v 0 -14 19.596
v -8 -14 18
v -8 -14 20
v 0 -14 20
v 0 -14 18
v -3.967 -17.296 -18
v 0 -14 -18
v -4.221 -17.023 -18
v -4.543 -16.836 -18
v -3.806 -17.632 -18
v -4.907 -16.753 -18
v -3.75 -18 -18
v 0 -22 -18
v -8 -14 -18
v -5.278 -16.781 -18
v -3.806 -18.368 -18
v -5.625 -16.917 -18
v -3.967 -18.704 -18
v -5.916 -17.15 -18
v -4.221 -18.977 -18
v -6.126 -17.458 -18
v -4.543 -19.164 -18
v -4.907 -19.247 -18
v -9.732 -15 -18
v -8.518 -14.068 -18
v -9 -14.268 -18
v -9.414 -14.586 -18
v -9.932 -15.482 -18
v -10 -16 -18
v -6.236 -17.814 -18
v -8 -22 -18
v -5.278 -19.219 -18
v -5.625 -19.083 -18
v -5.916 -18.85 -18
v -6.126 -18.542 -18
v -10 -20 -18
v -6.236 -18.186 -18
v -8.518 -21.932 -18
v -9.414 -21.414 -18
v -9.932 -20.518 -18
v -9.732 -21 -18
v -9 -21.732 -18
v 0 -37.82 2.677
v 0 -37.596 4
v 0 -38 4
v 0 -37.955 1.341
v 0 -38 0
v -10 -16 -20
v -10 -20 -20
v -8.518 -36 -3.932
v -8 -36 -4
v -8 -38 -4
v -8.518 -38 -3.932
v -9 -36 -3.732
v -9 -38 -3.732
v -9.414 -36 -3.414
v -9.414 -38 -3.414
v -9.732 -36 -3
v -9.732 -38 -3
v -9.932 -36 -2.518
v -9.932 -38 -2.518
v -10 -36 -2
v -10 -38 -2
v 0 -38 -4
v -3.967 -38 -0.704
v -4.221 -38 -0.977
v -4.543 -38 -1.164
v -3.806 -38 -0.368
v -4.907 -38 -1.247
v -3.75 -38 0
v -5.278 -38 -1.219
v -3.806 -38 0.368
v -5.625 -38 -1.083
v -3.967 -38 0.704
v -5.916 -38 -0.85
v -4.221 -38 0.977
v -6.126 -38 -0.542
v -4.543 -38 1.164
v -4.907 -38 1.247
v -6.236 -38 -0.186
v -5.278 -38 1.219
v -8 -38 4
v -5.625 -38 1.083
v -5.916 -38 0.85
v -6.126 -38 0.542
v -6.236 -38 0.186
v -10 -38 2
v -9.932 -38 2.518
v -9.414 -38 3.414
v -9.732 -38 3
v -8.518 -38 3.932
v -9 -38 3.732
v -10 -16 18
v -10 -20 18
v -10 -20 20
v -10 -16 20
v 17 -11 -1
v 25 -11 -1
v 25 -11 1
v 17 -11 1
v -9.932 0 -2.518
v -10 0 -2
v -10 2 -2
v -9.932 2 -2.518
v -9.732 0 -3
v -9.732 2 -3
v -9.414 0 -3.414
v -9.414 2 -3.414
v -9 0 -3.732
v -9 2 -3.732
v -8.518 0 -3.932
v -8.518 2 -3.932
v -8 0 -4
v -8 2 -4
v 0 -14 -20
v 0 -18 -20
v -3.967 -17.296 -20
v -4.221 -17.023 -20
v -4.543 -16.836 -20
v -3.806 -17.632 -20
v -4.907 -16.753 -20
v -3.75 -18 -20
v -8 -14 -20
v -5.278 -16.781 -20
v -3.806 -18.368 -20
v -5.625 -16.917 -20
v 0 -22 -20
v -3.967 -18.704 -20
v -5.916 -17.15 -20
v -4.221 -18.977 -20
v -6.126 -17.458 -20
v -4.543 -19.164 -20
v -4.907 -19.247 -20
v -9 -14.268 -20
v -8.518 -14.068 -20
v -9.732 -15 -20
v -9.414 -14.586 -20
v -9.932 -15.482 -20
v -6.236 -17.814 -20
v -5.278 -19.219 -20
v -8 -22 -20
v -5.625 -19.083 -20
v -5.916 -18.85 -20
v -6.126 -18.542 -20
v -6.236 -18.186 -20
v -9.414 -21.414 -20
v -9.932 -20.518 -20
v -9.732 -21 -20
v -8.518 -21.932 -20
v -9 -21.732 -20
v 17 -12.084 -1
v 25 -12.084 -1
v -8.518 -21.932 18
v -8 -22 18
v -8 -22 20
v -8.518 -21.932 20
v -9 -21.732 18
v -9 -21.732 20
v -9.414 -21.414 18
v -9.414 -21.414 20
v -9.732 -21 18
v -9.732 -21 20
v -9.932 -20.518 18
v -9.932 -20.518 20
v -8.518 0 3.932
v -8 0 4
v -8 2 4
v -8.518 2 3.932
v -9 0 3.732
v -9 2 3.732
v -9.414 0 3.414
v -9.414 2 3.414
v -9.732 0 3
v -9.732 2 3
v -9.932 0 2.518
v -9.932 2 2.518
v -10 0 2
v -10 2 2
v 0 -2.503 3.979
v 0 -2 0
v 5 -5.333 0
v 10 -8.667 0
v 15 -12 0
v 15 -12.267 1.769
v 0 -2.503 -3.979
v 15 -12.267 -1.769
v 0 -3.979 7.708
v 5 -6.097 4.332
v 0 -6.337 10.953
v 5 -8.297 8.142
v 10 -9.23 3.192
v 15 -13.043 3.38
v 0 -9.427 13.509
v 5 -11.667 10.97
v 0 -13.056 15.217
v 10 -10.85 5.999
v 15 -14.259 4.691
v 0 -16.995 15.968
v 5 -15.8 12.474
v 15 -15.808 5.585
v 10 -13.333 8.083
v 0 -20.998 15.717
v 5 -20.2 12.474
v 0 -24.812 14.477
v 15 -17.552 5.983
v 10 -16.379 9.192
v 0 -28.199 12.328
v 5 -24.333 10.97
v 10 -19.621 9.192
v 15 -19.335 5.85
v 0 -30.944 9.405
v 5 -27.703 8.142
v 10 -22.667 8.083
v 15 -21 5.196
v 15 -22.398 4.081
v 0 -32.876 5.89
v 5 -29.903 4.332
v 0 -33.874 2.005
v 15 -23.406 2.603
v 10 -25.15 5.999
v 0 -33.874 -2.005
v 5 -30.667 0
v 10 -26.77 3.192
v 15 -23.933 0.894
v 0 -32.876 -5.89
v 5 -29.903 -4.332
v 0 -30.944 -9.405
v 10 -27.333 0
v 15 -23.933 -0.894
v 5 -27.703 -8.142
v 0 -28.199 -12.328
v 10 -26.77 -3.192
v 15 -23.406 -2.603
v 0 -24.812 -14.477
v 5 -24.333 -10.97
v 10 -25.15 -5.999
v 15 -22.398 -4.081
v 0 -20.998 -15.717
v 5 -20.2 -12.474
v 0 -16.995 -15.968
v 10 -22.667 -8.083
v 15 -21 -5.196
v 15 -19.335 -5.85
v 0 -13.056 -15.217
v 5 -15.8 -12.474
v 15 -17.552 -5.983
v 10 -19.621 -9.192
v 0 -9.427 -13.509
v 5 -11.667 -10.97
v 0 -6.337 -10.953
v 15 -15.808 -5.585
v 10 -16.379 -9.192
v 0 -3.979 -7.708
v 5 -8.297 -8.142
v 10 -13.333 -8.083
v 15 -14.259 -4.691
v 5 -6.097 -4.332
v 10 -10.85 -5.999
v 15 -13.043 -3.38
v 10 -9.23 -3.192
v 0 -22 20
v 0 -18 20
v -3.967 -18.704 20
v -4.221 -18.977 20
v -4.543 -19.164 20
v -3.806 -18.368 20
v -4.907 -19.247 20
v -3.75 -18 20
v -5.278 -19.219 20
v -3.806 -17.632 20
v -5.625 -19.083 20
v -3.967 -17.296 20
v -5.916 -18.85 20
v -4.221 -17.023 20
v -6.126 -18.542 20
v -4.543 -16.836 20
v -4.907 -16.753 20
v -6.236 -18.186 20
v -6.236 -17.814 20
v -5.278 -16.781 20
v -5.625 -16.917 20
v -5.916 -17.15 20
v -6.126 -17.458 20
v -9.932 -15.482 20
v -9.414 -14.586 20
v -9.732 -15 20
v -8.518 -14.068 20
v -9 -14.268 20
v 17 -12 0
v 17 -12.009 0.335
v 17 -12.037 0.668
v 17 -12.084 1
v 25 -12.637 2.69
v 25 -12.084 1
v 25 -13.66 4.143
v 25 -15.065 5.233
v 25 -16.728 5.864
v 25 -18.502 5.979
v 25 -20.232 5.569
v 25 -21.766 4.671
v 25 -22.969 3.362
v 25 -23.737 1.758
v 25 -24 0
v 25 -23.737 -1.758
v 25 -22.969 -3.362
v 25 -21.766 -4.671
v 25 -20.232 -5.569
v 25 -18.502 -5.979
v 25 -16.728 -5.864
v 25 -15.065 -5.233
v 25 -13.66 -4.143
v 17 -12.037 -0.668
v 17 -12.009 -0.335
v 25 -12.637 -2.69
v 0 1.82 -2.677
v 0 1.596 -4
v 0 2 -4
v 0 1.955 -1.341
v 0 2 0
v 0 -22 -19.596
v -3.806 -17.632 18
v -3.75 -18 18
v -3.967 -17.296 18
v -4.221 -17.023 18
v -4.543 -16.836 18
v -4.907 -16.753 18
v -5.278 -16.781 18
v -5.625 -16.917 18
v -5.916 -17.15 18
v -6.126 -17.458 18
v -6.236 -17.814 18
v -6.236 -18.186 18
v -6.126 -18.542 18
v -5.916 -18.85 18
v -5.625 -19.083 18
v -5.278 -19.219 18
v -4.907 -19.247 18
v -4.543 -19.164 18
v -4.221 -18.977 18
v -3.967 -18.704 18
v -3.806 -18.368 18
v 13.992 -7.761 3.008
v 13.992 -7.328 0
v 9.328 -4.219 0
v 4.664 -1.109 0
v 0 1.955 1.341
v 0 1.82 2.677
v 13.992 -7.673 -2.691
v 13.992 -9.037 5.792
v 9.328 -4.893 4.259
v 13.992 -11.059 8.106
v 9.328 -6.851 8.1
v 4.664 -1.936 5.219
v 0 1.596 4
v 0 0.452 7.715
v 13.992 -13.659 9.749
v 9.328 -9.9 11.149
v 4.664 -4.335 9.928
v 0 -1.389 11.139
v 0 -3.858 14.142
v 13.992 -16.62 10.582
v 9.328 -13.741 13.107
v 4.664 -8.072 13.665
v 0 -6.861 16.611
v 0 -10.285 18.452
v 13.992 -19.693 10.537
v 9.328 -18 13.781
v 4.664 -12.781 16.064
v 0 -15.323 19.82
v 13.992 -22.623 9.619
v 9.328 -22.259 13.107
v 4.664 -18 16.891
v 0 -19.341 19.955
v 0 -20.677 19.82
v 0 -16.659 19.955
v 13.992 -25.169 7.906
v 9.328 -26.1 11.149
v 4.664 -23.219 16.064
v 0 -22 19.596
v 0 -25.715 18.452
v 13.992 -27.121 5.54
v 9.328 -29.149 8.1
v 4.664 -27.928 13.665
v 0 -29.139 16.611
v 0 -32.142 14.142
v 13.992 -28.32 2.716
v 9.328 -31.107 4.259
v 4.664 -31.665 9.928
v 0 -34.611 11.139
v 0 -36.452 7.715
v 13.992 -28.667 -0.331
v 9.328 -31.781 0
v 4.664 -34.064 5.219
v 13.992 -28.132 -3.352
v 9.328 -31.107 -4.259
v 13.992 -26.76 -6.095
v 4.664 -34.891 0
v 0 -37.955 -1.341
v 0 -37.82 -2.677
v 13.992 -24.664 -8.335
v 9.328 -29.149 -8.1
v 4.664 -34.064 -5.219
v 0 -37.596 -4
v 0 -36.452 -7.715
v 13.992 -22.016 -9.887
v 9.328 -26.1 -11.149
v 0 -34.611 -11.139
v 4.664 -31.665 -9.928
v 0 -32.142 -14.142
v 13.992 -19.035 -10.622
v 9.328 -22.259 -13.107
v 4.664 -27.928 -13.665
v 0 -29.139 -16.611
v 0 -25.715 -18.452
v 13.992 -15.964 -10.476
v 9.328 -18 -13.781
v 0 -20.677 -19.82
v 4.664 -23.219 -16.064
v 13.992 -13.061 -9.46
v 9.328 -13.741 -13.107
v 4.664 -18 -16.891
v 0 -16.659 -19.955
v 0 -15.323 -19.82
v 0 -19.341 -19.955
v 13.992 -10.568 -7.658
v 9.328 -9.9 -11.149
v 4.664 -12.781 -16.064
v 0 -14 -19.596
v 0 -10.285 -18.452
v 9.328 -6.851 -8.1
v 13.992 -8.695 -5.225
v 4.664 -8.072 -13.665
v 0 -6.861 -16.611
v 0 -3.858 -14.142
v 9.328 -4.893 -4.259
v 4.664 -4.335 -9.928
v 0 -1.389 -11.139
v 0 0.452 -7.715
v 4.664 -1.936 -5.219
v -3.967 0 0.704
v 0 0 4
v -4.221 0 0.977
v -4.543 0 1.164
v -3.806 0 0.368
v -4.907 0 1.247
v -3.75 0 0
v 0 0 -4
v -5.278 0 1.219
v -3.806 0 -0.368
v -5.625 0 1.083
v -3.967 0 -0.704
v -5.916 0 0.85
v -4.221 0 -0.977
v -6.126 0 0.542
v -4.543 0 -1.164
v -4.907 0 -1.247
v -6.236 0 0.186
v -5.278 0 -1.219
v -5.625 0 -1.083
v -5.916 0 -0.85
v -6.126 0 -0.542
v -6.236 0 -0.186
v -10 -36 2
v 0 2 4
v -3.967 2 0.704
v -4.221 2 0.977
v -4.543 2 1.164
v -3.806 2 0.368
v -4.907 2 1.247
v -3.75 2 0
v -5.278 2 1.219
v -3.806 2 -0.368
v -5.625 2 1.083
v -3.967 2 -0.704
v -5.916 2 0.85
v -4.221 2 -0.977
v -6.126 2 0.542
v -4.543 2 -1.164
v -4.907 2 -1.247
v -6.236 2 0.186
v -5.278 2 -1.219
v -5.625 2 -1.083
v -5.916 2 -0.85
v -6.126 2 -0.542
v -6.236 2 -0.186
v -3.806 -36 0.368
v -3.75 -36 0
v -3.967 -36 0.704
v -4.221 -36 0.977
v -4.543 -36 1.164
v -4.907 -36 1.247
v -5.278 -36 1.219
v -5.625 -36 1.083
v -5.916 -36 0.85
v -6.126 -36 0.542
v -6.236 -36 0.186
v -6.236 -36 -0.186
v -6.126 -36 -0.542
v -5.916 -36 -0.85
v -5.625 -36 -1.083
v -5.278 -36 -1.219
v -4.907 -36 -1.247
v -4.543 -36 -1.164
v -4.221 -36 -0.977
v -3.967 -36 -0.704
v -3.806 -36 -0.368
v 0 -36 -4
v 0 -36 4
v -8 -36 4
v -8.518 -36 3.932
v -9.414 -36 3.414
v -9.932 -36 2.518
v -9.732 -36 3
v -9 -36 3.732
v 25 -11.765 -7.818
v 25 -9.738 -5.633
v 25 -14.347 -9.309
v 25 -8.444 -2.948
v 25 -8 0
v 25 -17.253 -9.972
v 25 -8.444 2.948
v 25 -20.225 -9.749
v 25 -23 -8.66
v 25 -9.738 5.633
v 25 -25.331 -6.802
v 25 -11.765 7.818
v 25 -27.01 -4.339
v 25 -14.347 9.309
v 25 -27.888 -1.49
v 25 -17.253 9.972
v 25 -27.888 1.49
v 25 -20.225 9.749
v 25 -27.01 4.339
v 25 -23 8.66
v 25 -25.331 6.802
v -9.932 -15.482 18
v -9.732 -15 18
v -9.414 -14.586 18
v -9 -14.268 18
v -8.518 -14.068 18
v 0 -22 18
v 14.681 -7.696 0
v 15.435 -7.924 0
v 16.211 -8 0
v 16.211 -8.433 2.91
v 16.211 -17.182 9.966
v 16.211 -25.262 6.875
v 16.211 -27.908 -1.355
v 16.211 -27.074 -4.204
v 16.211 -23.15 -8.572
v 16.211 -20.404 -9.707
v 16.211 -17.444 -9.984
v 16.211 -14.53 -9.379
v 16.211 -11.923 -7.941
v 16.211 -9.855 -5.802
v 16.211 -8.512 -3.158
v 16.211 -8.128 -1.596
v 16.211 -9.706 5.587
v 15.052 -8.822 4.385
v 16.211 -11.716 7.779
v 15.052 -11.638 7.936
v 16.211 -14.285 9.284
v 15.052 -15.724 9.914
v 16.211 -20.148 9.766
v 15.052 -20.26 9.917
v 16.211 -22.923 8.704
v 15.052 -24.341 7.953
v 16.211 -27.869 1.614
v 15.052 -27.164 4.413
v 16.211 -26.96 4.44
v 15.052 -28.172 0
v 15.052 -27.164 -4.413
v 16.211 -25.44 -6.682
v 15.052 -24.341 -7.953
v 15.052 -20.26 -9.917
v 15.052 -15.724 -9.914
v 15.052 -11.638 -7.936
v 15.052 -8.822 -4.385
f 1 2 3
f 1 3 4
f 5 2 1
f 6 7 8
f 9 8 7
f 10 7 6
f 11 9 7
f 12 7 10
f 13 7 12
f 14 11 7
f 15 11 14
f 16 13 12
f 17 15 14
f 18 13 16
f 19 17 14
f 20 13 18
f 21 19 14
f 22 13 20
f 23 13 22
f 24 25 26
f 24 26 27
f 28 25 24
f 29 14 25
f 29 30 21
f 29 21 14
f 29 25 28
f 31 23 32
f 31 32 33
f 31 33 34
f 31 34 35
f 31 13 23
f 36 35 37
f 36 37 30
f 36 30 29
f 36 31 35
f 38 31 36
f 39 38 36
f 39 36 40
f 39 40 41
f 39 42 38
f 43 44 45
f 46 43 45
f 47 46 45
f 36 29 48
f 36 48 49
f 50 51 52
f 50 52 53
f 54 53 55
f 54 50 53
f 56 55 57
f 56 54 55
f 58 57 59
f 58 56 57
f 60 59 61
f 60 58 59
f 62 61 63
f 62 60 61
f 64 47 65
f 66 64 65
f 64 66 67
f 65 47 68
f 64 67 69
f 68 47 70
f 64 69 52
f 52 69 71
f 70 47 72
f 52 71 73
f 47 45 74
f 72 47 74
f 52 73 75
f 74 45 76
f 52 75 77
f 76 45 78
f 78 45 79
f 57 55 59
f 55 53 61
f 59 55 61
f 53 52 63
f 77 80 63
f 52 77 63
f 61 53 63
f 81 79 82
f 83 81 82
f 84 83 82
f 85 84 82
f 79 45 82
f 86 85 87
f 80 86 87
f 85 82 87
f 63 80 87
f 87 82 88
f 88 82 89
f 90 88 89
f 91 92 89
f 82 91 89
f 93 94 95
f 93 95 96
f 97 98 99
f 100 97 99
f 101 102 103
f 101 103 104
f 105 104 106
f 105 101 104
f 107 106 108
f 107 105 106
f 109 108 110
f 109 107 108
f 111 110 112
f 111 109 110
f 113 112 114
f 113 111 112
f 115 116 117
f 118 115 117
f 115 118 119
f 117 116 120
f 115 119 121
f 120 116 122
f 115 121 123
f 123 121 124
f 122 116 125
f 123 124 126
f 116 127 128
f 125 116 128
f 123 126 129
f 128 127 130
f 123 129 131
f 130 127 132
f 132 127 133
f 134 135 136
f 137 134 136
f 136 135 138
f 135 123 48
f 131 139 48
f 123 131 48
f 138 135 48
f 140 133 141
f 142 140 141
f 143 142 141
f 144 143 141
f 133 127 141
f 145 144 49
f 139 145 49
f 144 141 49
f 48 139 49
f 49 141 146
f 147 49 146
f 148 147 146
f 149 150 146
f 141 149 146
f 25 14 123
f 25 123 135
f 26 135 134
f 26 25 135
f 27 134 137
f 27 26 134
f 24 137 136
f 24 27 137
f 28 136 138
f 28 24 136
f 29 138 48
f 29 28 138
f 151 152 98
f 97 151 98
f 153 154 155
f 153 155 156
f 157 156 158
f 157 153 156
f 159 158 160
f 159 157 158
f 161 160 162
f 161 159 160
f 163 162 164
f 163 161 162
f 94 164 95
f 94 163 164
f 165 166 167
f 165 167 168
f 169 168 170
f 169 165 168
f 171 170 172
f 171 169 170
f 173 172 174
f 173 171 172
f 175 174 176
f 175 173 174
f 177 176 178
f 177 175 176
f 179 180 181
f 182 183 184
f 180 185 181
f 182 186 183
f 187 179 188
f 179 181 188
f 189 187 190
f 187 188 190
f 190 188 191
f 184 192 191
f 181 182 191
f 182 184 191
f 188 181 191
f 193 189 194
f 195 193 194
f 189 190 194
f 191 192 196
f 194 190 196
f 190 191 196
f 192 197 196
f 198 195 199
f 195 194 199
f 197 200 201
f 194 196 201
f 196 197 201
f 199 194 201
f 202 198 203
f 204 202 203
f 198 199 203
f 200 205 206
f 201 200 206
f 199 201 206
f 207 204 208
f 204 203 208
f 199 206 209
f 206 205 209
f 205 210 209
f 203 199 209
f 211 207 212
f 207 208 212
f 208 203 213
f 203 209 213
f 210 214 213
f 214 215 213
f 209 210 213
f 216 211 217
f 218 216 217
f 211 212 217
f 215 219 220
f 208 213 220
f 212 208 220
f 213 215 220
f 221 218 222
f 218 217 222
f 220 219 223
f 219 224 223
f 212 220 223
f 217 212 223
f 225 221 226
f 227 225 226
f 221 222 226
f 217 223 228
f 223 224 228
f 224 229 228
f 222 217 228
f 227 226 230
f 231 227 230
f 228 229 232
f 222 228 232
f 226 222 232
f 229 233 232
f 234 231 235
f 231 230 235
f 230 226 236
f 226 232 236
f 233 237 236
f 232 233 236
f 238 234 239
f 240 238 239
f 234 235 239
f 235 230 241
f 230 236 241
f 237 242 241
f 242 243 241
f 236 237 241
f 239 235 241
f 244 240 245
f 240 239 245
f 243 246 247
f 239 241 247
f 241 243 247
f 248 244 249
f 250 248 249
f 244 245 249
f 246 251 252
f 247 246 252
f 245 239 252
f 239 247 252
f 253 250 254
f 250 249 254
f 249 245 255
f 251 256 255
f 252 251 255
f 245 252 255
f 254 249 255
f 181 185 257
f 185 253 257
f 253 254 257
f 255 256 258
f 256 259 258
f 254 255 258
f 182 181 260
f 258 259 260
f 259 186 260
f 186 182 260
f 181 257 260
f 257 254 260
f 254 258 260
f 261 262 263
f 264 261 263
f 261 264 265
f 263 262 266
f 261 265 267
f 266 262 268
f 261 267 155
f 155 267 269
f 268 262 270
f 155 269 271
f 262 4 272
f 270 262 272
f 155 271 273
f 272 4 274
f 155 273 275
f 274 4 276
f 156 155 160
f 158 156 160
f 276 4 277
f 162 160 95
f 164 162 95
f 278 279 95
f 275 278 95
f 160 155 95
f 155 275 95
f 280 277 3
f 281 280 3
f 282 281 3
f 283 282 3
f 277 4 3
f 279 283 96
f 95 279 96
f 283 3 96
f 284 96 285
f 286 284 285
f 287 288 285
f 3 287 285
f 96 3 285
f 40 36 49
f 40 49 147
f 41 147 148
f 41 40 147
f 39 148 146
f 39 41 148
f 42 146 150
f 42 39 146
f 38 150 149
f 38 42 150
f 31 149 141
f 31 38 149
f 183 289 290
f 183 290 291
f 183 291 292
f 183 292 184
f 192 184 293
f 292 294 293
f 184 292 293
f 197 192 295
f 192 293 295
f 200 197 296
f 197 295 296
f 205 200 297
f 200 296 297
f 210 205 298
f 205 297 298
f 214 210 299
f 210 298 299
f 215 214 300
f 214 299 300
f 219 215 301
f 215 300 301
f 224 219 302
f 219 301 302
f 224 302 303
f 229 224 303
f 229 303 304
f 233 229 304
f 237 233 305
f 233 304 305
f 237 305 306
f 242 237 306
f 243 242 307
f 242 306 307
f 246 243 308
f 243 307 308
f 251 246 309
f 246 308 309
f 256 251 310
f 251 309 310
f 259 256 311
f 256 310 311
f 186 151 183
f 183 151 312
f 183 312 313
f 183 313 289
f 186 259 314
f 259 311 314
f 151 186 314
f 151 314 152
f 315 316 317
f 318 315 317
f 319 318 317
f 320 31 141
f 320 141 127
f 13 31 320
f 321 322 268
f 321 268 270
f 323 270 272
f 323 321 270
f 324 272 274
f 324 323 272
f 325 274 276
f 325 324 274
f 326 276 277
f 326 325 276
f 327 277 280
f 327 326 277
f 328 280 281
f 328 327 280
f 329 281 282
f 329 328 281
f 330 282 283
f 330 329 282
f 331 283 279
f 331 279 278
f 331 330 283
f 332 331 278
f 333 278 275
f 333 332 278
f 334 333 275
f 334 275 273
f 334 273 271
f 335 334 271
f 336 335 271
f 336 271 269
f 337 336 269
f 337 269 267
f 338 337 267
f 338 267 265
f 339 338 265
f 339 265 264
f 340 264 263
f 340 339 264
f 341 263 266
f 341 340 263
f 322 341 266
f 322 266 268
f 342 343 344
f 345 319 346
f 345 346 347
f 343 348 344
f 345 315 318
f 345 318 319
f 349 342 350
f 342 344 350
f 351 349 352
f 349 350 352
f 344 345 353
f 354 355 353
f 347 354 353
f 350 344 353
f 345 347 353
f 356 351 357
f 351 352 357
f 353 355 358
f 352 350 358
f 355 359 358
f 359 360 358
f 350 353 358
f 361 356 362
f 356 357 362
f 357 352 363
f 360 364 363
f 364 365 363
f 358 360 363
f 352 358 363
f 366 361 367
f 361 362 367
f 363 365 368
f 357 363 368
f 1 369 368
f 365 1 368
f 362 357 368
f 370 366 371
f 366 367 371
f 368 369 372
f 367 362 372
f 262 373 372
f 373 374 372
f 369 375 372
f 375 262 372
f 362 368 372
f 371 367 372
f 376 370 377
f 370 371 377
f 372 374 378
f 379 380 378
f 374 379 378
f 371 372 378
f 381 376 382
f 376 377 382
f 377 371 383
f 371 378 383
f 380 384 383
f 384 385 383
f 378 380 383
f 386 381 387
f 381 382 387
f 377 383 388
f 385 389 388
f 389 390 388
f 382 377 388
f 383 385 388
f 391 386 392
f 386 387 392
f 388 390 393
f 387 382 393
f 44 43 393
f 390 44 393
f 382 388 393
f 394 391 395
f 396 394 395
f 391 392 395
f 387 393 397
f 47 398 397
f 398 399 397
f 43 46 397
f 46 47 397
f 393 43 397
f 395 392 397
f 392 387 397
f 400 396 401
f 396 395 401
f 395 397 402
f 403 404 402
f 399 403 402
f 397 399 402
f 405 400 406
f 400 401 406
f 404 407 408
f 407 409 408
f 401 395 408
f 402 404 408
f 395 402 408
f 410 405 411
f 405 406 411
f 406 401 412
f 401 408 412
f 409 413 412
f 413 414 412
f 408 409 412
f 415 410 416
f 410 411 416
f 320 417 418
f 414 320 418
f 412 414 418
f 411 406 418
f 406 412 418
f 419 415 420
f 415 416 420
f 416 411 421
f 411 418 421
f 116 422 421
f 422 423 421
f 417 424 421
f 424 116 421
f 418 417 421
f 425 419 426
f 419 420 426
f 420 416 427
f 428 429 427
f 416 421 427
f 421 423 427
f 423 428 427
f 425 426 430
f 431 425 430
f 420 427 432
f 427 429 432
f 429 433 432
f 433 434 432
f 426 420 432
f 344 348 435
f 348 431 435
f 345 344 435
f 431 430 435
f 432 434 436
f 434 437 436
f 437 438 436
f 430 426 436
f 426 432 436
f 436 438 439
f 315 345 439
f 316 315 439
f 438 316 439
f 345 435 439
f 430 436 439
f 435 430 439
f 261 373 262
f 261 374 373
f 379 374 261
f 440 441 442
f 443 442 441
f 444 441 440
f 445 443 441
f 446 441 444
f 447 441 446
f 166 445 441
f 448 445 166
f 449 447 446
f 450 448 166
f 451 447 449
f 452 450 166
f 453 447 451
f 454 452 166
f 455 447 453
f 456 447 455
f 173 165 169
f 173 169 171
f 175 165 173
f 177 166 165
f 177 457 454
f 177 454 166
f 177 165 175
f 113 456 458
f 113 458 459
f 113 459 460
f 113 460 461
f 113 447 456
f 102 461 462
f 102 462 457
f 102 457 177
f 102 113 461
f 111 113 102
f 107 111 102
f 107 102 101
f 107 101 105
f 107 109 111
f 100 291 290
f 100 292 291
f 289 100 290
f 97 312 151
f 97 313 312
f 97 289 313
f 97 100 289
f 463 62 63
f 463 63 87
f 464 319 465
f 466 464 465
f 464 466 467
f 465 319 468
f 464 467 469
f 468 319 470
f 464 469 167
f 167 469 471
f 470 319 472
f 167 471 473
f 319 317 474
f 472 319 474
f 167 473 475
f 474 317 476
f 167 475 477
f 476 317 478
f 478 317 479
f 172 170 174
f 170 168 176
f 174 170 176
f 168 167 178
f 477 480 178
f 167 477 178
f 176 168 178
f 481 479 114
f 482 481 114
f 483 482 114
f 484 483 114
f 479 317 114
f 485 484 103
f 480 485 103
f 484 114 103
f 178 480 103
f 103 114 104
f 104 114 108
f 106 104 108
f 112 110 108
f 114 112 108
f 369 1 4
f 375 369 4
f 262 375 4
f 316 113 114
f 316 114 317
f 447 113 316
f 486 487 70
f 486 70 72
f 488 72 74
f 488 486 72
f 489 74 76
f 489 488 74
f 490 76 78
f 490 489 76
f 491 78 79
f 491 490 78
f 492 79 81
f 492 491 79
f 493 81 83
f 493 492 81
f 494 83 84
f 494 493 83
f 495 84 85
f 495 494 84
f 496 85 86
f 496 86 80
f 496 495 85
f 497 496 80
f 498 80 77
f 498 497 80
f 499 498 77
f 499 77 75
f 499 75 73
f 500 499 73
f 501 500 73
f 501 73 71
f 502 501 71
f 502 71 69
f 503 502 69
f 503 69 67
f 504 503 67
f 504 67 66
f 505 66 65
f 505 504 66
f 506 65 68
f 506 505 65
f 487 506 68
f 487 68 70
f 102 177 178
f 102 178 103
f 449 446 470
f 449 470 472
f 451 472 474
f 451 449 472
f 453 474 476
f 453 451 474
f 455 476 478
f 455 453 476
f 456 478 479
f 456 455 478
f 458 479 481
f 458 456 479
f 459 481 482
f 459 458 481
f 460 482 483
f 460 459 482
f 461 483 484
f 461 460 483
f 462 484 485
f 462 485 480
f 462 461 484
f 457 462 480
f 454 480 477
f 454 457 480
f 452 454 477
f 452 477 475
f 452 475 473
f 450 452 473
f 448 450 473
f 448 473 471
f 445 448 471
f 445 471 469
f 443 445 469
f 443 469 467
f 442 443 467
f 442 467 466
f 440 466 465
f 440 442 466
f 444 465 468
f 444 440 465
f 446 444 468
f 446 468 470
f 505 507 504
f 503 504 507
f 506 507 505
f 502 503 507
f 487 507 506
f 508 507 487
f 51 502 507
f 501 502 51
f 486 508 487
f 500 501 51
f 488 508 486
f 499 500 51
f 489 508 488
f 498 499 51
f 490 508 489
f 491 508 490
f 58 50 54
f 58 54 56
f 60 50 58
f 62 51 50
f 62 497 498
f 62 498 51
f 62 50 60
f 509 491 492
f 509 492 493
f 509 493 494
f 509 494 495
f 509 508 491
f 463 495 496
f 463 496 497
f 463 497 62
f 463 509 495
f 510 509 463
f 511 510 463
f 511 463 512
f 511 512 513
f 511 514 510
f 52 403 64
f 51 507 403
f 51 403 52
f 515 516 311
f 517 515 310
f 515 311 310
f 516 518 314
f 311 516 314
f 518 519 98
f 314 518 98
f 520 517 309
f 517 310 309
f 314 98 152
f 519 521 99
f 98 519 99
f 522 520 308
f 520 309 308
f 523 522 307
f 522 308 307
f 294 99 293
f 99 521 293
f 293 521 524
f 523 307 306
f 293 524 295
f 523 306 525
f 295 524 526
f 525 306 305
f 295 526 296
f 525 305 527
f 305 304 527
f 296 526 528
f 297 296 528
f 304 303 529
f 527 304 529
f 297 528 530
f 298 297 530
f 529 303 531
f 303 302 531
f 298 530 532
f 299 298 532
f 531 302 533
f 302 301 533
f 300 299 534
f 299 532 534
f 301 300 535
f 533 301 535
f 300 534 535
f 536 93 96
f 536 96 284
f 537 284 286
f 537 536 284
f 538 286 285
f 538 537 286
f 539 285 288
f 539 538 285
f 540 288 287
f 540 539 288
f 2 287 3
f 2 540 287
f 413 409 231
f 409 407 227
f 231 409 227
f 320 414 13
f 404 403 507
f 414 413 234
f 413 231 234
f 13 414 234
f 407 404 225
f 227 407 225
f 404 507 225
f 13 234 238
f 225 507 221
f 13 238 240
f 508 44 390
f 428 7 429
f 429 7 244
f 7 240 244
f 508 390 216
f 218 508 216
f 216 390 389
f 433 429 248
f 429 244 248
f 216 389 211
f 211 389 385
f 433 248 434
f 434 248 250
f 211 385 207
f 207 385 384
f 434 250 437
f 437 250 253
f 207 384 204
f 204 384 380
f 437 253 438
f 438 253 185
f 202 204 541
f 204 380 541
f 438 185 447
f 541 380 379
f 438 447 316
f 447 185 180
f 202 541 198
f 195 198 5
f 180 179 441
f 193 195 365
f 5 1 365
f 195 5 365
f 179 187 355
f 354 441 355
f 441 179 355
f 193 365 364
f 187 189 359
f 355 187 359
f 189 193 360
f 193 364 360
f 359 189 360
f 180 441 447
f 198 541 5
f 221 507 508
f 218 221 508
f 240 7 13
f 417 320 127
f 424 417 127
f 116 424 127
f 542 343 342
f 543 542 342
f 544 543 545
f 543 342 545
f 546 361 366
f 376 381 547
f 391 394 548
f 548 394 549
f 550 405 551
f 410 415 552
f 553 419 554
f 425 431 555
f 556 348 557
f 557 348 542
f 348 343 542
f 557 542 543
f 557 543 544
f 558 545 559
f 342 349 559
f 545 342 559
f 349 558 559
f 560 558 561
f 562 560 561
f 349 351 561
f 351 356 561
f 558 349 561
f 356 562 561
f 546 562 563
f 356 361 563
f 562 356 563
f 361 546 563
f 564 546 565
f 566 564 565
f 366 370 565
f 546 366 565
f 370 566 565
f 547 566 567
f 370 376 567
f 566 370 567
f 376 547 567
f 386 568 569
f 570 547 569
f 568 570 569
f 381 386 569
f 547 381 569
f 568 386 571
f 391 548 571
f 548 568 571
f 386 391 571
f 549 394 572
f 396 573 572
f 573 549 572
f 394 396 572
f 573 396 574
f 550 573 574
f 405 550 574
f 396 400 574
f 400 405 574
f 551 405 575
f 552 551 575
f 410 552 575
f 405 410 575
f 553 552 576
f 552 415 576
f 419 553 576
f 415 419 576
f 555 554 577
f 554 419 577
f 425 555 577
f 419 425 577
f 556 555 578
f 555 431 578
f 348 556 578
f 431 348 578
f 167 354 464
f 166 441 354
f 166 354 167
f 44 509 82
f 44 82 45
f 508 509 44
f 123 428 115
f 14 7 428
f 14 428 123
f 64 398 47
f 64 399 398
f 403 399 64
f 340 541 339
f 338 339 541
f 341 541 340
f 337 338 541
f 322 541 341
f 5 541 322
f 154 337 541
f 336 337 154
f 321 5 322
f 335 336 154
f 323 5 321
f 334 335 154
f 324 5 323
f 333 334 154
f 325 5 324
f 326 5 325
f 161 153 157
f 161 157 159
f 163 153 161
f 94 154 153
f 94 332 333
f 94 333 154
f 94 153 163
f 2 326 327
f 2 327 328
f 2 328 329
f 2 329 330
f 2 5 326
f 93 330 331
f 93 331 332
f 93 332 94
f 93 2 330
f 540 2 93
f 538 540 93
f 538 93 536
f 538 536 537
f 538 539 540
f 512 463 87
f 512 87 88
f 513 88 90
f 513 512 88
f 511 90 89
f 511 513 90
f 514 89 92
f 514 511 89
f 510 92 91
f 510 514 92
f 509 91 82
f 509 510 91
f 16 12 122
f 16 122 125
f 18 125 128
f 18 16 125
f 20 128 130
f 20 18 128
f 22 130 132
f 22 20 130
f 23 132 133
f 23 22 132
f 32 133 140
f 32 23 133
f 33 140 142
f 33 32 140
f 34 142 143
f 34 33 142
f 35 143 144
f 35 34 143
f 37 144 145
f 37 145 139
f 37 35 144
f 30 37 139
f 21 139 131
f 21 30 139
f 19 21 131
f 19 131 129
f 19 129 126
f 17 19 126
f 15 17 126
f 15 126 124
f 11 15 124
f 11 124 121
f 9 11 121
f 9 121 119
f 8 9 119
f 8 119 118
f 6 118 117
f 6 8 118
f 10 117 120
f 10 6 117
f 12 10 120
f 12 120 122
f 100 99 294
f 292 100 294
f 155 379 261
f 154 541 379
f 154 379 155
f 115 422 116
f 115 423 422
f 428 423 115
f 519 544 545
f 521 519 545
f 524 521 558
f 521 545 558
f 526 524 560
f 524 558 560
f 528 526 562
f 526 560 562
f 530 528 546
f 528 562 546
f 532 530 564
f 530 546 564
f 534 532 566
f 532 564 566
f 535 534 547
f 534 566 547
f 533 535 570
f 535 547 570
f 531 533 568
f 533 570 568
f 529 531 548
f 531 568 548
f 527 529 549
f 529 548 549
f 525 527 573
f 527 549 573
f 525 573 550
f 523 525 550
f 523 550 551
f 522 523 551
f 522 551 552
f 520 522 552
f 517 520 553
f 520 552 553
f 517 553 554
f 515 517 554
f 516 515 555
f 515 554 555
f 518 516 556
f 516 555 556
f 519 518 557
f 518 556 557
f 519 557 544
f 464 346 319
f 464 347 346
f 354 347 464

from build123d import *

# Parameters (mm, degrees)
SKETCH1_R           = 1.25
BOSS_EXTRUDE1_DEPTH = 2
CIRPATTERN1_COUNT   = 4
FILLET1_R           = 4
CUT_EXTRUDE1_DEPTH  = 8


with BuildPart() as part:
    # Sketch1 → Boss-Extrude1 (new body)
    with BuildSketch(Plane(origin=(0, 0, 0), x_dir=(1, 0, 0), z_dir=(0, 1, 0))):
        with BuildLine():
            Line((0, 4), (0, -4))
            Line((0, -4), (-8, -4))
            ThreePointArc((-8, -4), (-9.414213562, -3.414213562), (-10, -2))
            Line((-10, -2), (-10, 2))
            ThreePointArc((-10, 2), (-9.414213562, 3.414213562), (-8, 4))
            Line((-8, 4), (0, 4))
        make_face()
        with Locations((-5, 0)):
            Circle(SKETCH1_R, mode=Mode.SUBTRACT)
    boss_extrude1 = extrude(amount=BOSS_EXTRUDE1_DEPTH)

    # Sketch2 → Revolve1 (revolve)
    with BuildSketch(Plane.XY):
        Polygon((0, 2), (0, -2), (15, -12), (25, -12), (25, -8), (15, -8), align=None)
    revolve(axis=Axis((-9.784018472, -18, 0), (1, 0, 0)))

    # CirPattern1: Boss-Extrude1 ×4 about axis
    cirpattern1_axis = Axis((0, -18, 0), (1, 0, 0))
    for i in range(1, CIRPATTERN1_COUNT):
        add(boss_extrude1.rotate(cirpattern1_axis, i * 360 / CIRPATTERN1_COUNT))

    # Fillet1
    fillet1_edges = [part.edges().sort_by_distance(p)[0] for p in [
        (15, -28, 0),
    ]]
    fillet(fillet1_edges, radius=FILLET1_R)

    # Sketch3 → Cut-Extrude1 (cut)
    with BuildSketch(Plane(origin=(25, 0, 0), x_dir=(0, 0, -1), z_dir=(1, 0, 0))):
        Polygon((1, -12), (1, -11), (-1, -11), (-1, -12), (-1, -12.906953831), (1, -12.906953831), align=None)
    extrude(amount=-CUT_EXTRUDE1_DEPTH, mode=Mode.SUBTRACT)


solid = part.part
